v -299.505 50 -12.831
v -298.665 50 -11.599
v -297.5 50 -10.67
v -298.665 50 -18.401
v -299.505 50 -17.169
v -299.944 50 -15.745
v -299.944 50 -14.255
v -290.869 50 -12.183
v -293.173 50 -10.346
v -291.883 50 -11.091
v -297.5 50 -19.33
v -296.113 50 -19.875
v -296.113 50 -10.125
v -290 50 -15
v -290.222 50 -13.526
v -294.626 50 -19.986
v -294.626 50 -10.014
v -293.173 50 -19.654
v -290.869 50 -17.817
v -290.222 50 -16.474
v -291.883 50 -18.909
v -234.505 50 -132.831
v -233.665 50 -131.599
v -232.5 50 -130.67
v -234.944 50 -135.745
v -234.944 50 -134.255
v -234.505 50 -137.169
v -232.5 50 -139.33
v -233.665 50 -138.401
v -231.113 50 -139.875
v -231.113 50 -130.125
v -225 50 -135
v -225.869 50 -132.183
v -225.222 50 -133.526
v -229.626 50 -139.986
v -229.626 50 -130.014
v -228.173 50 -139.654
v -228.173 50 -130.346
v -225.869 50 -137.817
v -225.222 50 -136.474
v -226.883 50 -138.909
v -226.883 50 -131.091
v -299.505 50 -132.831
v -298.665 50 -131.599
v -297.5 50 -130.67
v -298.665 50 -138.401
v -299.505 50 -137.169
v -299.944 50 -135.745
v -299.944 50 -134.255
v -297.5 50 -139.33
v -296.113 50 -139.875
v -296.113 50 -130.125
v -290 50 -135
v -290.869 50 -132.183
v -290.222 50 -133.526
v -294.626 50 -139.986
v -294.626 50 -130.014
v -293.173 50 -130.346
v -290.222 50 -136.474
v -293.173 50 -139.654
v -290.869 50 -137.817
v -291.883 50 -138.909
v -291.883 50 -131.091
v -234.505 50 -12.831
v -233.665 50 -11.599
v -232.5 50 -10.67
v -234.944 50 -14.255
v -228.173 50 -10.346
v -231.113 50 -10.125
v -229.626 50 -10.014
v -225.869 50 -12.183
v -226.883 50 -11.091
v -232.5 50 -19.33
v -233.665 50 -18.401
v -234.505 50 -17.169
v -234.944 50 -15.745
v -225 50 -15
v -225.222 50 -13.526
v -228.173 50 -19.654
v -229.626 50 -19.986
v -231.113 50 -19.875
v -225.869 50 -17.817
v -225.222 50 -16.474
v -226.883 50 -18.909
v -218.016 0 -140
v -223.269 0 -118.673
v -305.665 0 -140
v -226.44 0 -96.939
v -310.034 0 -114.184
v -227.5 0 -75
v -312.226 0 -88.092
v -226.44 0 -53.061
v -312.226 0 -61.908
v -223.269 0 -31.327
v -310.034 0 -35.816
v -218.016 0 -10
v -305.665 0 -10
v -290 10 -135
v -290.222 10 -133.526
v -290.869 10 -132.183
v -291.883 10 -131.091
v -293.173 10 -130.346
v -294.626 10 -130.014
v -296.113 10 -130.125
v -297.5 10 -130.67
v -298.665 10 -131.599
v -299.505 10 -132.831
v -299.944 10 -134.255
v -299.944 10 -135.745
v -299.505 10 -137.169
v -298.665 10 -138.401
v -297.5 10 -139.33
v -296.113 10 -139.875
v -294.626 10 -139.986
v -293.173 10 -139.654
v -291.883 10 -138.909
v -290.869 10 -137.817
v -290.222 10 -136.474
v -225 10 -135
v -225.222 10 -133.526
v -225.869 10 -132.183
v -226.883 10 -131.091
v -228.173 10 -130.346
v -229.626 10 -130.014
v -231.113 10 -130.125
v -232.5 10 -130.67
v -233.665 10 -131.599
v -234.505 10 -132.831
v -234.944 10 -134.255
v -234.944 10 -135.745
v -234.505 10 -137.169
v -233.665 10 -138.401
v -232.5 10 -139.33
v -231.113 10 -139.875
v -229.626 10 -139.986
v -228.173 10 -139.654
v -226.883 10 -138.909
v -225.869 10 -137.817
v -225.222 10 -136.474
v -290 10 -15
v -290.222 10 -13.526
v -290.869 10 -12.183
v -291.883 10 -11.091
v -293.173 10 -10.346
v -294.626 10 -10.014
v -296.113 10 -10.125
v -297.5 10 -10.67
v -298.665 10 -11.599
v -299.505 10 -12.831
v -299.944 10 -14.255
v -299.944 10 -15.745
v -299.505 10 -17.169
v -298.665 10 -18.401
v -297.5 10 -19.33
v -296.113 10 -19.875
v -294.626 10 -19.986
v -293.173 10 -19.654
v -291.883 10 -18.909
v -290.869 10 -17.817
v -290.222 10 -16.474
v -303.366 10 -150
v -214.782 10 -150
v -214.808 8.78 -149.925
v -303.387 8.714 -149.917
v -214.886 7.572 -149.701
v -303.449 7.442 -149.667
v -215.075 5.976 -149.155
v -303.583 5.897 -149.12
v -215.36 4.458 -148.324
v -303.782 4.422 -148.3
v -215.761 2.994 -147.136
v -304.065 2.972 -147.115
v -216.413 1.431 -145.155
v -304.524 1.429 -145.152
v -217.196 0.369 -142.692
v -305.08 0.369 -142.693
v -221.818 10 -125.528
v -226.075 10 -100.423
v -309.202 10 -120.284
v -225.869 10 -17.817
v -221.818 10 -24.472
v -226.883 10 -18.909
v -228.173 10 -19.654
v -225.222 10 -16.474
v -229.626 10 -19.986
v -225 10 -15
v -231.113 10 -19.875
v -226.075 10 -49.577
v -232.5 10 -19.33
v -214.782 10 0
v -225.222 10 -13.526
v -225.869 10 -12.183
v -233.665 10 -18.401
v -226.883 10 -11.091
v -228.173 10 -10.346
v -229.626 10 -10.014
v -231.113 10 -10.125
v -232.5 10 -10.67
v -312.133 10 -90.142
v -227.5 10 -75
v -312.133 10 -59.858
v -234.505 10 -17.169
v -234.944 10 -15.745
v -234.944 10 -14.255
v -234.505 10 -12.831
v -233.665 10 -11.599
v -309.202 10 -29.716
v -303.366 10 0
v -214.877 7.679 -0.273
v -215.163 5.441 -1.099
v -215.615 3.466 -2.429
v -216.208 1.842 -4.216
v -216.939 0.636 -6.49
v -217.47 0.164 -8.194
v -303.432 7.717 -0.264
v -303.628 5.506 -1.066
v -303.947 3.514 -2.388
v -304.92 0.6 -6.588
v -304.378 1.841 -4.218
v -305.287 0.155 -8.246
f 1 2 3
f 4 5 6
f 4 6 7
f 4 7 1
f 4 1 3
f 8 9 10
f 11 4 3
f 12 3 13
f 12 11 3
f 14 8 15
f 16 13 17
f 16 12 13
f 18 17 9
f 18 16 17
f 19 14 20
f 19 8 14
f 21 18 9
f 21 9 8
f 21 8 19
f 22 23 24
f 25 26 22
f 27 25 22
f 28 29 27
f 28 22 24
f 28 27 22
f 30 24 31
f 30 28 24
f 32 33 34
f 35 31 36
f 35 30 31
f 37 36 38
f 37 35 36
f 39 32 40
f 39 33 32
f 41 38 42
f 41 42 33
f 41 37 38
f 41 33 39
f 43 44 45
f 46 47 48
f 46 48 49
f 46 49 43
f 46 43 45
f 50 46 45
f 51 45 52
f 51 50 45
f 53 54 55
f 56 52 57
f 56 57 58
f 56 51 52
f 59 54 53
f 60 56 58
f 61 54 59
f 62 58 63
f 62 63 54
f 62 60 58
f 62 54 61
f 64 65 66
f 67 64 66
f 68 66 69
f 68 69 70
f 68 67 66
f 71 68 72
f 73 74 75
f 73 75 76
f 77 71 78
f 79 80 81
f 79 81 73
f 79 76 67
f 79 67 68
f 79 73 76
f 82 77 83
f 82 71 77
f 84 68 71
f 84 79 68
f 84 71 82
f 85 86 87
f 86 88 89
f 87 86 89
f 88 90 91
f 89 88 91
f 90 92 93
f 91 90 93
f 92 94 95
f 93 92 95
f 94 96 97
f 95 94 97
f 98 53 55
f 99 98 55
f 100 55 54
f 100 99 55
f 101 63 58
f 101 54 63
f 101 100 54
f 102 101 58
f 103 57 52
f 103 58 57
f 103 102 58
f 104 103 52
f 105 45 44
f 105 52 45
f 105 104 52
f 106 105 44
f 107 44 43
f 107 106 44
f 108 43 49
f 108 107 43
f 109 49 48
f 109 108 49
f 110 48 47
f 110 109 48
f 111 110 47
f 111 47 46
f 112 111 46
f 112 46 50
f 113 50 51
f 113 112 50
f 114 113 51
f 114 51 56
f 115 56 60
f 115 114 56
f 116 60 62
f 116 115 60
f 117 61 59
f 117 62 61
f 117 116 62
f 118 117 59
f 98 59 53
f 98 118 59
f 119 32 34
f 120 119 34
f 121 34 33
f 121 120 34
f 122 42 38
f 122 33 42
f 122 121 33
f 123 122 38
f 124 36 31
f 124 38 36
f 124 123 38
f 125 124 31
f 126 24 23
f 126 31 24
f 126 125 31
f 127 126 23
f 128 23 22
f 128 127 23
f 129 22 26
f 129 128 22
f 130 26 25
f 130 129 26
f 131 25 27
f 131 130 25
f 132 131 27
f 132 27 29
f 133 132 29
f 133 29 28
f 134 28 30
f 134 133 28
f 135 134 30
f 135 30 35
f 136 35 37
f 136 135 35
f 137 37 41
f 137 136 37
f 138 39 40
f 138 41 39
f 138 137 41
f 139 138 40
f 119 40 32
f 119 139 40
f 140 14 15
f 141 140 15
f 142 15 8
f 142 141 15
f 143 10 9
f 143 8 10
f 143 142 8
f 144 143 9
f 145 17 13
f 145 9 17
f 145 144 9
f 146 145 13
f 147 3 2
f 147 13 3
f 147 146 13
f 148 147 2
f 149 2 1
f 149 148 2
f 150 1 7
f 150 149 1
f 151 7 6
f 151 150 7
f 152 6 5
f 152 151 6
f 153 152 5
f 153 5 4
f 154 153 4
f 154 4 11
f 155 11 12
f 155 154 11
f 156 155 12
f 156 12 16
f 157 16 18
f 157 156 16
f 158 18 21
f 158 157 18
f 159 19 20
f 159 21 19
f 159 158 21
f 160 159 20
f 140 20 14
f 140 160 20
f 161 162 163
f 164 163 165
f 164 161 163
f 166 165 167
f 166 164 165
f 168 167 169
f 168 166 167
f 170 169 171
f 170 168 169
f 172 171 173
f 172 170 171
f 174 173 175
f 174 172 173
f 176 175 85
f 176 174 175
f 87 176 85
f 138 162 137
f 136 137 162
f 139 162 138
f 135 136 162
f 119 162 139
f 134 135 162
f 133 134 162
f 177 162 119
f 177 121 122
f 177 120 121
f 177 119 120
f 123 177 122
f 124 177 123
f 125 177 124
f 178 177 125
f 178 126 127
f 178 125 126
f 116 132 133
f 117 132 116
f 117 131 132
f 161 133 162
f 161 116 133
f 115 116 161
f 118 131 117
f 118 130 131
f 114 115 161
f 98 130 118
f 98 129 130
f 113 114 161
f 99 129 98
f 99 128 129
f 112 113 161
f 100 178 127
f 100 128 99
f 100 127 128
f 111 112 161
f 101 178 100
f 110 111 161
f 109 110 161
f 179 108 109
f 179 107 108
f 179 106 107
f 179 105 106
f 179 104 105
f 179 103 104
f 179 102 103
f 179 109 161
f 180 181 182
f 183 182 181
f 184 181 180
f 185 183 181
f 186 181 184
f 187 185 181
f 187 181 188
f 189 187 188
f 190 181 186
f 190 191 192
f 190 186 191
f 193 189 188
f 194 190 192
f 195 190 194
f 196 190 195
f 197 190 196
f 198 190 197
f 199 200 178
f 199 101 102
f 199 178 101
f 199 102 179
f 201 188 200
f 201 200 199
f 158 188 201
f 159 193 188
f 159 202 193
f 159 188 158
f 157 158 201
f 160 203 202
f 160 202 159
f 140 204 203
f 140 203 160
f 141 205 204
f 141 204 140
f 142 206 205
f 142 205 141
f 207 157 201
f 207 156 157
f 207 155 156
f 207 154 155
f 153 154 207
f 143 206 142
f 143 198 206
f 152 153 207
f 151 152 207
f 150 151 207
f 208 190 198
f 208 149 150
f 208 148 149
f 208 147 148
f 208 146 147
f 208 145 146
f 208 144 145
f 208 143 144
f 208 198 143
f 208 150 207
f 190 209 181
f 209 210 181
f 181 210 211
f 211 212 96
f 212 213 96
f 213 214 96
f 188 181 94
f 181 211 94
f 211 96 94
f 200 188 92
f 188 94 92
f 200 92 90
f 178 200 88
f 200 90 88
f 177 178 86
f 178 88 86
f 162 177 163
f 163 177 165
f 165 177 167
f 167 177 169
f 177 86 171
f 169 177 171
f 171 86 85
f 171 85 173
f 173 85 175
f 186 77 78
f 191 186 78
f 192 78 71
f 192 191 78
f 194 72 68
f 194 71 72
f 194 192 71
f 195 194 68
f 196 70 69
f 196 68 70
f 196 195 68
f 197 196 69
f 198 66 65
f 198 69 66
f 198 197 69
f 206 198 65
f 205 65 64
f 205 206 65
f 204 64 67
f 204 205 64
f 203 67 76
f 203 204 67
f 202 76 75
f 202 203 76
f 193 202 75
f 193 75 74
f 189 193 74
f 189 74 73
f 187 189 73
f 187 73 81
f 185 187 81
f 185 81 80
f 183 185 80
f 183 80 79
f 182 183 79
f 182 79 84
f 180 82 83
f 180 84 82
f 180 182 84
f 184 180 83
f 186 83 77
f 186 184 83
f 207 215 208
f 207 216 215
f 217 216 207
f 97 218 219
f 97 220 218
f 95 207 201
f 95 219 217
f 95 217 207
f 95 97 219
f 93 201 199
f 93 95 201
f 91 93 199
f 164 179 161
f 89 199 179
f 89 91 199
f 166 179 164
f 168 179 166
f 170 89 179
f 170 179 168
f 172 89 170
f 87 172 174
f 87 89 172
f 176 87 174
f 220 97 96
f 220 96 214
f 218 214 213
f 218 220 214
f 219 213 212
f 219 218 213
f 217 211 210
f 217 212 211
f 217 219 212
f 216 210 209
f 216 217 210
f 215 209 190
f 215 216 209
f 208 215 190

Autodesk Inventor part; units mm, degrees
ref_plane "YZ Plane" through (0, 0, 0) normal (1, 0, 0) x (0, 1, 0)
ref_plane "XZ Plane" through (0, 0, 0) normal (0, 1, 0) x (-1, 0, 0)
ref_plane "XY Plane" through (0, 0, 0) normal (0, 0, 1) x (1, 0, 0)
sketch "Sketch1" plane through (0, 0, 0) normal (0, 1, 0) x (-1, 0, 0)
  circle A0 centre (0, -75) radius 227.5
  circle A1 centre (0, -75) radius 312.5
  line L0 (214.7819, -150) -> (303.3665, -150)
  line L1 (214.7819, 0) -> (303.3665, 0)
  line L2 (437.5, 0) -> (-437.5, 0) projected
  line L3 (259.0742, 0) -> (259.0742, -150) construction
  line L4 (0, 0) -> (0, -75)
  dimension "d0" = 455
  dimension "d1" = 625
  dimension "d4" = 150
  dimension "d5" = 75
extrude "Extrusion1" add sketch "Sketch1" along normal blind 10 contours A0 L1 A1 L0
sketch "Sketch2" plane through (0, 10, 0) normal (0, 1, 0) x (1, 0, 0)
  arc A0 (-214.7819, 150) -> (-214.7819, 0) centre (0, 75) ccw projected
  line L0 (-214.7819, 150) -> (-303.3665, 150) projected
  arc A1 (-303.3665, 150) -> (-303.3665, 0) centre (0, 75) ccw projected
  line L1 (-303.3665, 0) -> (-214.7819, 0) projected
  line L2 (-227.5, 75) -> (-312.5, 75) construction
  line L3 (-270, 75) -> (-270, 150) construction
  line L4 (-270, 75) -> (-270, 0) construction
  line L5 (-295, 25) -> (-245, 25)
  line L6 (-245, 25) -> (-245, 125)
  line L7 (-245, 125) -> (-295, 125)
  line L8 (-295, 125) -> (-295, 25)
  line L9 (-295, 75) -> (-245, 75) construction
  line L10 (-270, 25) -> (-270, 125) construction
  line L11 (-295, 25) -> (-295, 15) construction
  line L12 (-245, 25) -> (-245, 15) construction
  line L13 (-245, 25) -> (-235, 25) construction
  line L14 (-245, 15) -> (-230, 15) construction
  line L15 (-245, 125) -> (-245, 135) construction
  line L16 (-245, 135) -> (-230, 135) construction
  line L17 (-295, 125) -> (-295, 135) construction
  circle A2 centre (-295, 15) radius 5
  circle A3 centre (-230, 15) radius 5
  circle A4 centre (-230, 135) radius 5
  circle A5 centre (-295, 135) radius 5
  point P0 (0, 0)
  dimension "d8" = 50
  dimension "d9" = 100
  dimension "d10" = 10
  dimension "d11" = 10
  dimension "d12" = 90
  dimension "d13" = 15
  dimension "d14" = 10
  dimension "d15" = 15
  dimension "d16" = 90
  dimension "d17" = 10
  dimension "d18" = 10
  dimension "d19" = 10
  dimension "d20" = 10
  dimension "d21" = 10
extrude "Extrusion2" add sketch "Sketch2" along normal blind 40 contours A2 | A3 | A4 | A5
fillet "Fillet1" radius 10 2 edges at (-259.0742, 0, 0) (-259.0742, 0, -150)
properties part number "Battery Cage Spring Plate Second Iteration" material "PLA 33 Plastic"
